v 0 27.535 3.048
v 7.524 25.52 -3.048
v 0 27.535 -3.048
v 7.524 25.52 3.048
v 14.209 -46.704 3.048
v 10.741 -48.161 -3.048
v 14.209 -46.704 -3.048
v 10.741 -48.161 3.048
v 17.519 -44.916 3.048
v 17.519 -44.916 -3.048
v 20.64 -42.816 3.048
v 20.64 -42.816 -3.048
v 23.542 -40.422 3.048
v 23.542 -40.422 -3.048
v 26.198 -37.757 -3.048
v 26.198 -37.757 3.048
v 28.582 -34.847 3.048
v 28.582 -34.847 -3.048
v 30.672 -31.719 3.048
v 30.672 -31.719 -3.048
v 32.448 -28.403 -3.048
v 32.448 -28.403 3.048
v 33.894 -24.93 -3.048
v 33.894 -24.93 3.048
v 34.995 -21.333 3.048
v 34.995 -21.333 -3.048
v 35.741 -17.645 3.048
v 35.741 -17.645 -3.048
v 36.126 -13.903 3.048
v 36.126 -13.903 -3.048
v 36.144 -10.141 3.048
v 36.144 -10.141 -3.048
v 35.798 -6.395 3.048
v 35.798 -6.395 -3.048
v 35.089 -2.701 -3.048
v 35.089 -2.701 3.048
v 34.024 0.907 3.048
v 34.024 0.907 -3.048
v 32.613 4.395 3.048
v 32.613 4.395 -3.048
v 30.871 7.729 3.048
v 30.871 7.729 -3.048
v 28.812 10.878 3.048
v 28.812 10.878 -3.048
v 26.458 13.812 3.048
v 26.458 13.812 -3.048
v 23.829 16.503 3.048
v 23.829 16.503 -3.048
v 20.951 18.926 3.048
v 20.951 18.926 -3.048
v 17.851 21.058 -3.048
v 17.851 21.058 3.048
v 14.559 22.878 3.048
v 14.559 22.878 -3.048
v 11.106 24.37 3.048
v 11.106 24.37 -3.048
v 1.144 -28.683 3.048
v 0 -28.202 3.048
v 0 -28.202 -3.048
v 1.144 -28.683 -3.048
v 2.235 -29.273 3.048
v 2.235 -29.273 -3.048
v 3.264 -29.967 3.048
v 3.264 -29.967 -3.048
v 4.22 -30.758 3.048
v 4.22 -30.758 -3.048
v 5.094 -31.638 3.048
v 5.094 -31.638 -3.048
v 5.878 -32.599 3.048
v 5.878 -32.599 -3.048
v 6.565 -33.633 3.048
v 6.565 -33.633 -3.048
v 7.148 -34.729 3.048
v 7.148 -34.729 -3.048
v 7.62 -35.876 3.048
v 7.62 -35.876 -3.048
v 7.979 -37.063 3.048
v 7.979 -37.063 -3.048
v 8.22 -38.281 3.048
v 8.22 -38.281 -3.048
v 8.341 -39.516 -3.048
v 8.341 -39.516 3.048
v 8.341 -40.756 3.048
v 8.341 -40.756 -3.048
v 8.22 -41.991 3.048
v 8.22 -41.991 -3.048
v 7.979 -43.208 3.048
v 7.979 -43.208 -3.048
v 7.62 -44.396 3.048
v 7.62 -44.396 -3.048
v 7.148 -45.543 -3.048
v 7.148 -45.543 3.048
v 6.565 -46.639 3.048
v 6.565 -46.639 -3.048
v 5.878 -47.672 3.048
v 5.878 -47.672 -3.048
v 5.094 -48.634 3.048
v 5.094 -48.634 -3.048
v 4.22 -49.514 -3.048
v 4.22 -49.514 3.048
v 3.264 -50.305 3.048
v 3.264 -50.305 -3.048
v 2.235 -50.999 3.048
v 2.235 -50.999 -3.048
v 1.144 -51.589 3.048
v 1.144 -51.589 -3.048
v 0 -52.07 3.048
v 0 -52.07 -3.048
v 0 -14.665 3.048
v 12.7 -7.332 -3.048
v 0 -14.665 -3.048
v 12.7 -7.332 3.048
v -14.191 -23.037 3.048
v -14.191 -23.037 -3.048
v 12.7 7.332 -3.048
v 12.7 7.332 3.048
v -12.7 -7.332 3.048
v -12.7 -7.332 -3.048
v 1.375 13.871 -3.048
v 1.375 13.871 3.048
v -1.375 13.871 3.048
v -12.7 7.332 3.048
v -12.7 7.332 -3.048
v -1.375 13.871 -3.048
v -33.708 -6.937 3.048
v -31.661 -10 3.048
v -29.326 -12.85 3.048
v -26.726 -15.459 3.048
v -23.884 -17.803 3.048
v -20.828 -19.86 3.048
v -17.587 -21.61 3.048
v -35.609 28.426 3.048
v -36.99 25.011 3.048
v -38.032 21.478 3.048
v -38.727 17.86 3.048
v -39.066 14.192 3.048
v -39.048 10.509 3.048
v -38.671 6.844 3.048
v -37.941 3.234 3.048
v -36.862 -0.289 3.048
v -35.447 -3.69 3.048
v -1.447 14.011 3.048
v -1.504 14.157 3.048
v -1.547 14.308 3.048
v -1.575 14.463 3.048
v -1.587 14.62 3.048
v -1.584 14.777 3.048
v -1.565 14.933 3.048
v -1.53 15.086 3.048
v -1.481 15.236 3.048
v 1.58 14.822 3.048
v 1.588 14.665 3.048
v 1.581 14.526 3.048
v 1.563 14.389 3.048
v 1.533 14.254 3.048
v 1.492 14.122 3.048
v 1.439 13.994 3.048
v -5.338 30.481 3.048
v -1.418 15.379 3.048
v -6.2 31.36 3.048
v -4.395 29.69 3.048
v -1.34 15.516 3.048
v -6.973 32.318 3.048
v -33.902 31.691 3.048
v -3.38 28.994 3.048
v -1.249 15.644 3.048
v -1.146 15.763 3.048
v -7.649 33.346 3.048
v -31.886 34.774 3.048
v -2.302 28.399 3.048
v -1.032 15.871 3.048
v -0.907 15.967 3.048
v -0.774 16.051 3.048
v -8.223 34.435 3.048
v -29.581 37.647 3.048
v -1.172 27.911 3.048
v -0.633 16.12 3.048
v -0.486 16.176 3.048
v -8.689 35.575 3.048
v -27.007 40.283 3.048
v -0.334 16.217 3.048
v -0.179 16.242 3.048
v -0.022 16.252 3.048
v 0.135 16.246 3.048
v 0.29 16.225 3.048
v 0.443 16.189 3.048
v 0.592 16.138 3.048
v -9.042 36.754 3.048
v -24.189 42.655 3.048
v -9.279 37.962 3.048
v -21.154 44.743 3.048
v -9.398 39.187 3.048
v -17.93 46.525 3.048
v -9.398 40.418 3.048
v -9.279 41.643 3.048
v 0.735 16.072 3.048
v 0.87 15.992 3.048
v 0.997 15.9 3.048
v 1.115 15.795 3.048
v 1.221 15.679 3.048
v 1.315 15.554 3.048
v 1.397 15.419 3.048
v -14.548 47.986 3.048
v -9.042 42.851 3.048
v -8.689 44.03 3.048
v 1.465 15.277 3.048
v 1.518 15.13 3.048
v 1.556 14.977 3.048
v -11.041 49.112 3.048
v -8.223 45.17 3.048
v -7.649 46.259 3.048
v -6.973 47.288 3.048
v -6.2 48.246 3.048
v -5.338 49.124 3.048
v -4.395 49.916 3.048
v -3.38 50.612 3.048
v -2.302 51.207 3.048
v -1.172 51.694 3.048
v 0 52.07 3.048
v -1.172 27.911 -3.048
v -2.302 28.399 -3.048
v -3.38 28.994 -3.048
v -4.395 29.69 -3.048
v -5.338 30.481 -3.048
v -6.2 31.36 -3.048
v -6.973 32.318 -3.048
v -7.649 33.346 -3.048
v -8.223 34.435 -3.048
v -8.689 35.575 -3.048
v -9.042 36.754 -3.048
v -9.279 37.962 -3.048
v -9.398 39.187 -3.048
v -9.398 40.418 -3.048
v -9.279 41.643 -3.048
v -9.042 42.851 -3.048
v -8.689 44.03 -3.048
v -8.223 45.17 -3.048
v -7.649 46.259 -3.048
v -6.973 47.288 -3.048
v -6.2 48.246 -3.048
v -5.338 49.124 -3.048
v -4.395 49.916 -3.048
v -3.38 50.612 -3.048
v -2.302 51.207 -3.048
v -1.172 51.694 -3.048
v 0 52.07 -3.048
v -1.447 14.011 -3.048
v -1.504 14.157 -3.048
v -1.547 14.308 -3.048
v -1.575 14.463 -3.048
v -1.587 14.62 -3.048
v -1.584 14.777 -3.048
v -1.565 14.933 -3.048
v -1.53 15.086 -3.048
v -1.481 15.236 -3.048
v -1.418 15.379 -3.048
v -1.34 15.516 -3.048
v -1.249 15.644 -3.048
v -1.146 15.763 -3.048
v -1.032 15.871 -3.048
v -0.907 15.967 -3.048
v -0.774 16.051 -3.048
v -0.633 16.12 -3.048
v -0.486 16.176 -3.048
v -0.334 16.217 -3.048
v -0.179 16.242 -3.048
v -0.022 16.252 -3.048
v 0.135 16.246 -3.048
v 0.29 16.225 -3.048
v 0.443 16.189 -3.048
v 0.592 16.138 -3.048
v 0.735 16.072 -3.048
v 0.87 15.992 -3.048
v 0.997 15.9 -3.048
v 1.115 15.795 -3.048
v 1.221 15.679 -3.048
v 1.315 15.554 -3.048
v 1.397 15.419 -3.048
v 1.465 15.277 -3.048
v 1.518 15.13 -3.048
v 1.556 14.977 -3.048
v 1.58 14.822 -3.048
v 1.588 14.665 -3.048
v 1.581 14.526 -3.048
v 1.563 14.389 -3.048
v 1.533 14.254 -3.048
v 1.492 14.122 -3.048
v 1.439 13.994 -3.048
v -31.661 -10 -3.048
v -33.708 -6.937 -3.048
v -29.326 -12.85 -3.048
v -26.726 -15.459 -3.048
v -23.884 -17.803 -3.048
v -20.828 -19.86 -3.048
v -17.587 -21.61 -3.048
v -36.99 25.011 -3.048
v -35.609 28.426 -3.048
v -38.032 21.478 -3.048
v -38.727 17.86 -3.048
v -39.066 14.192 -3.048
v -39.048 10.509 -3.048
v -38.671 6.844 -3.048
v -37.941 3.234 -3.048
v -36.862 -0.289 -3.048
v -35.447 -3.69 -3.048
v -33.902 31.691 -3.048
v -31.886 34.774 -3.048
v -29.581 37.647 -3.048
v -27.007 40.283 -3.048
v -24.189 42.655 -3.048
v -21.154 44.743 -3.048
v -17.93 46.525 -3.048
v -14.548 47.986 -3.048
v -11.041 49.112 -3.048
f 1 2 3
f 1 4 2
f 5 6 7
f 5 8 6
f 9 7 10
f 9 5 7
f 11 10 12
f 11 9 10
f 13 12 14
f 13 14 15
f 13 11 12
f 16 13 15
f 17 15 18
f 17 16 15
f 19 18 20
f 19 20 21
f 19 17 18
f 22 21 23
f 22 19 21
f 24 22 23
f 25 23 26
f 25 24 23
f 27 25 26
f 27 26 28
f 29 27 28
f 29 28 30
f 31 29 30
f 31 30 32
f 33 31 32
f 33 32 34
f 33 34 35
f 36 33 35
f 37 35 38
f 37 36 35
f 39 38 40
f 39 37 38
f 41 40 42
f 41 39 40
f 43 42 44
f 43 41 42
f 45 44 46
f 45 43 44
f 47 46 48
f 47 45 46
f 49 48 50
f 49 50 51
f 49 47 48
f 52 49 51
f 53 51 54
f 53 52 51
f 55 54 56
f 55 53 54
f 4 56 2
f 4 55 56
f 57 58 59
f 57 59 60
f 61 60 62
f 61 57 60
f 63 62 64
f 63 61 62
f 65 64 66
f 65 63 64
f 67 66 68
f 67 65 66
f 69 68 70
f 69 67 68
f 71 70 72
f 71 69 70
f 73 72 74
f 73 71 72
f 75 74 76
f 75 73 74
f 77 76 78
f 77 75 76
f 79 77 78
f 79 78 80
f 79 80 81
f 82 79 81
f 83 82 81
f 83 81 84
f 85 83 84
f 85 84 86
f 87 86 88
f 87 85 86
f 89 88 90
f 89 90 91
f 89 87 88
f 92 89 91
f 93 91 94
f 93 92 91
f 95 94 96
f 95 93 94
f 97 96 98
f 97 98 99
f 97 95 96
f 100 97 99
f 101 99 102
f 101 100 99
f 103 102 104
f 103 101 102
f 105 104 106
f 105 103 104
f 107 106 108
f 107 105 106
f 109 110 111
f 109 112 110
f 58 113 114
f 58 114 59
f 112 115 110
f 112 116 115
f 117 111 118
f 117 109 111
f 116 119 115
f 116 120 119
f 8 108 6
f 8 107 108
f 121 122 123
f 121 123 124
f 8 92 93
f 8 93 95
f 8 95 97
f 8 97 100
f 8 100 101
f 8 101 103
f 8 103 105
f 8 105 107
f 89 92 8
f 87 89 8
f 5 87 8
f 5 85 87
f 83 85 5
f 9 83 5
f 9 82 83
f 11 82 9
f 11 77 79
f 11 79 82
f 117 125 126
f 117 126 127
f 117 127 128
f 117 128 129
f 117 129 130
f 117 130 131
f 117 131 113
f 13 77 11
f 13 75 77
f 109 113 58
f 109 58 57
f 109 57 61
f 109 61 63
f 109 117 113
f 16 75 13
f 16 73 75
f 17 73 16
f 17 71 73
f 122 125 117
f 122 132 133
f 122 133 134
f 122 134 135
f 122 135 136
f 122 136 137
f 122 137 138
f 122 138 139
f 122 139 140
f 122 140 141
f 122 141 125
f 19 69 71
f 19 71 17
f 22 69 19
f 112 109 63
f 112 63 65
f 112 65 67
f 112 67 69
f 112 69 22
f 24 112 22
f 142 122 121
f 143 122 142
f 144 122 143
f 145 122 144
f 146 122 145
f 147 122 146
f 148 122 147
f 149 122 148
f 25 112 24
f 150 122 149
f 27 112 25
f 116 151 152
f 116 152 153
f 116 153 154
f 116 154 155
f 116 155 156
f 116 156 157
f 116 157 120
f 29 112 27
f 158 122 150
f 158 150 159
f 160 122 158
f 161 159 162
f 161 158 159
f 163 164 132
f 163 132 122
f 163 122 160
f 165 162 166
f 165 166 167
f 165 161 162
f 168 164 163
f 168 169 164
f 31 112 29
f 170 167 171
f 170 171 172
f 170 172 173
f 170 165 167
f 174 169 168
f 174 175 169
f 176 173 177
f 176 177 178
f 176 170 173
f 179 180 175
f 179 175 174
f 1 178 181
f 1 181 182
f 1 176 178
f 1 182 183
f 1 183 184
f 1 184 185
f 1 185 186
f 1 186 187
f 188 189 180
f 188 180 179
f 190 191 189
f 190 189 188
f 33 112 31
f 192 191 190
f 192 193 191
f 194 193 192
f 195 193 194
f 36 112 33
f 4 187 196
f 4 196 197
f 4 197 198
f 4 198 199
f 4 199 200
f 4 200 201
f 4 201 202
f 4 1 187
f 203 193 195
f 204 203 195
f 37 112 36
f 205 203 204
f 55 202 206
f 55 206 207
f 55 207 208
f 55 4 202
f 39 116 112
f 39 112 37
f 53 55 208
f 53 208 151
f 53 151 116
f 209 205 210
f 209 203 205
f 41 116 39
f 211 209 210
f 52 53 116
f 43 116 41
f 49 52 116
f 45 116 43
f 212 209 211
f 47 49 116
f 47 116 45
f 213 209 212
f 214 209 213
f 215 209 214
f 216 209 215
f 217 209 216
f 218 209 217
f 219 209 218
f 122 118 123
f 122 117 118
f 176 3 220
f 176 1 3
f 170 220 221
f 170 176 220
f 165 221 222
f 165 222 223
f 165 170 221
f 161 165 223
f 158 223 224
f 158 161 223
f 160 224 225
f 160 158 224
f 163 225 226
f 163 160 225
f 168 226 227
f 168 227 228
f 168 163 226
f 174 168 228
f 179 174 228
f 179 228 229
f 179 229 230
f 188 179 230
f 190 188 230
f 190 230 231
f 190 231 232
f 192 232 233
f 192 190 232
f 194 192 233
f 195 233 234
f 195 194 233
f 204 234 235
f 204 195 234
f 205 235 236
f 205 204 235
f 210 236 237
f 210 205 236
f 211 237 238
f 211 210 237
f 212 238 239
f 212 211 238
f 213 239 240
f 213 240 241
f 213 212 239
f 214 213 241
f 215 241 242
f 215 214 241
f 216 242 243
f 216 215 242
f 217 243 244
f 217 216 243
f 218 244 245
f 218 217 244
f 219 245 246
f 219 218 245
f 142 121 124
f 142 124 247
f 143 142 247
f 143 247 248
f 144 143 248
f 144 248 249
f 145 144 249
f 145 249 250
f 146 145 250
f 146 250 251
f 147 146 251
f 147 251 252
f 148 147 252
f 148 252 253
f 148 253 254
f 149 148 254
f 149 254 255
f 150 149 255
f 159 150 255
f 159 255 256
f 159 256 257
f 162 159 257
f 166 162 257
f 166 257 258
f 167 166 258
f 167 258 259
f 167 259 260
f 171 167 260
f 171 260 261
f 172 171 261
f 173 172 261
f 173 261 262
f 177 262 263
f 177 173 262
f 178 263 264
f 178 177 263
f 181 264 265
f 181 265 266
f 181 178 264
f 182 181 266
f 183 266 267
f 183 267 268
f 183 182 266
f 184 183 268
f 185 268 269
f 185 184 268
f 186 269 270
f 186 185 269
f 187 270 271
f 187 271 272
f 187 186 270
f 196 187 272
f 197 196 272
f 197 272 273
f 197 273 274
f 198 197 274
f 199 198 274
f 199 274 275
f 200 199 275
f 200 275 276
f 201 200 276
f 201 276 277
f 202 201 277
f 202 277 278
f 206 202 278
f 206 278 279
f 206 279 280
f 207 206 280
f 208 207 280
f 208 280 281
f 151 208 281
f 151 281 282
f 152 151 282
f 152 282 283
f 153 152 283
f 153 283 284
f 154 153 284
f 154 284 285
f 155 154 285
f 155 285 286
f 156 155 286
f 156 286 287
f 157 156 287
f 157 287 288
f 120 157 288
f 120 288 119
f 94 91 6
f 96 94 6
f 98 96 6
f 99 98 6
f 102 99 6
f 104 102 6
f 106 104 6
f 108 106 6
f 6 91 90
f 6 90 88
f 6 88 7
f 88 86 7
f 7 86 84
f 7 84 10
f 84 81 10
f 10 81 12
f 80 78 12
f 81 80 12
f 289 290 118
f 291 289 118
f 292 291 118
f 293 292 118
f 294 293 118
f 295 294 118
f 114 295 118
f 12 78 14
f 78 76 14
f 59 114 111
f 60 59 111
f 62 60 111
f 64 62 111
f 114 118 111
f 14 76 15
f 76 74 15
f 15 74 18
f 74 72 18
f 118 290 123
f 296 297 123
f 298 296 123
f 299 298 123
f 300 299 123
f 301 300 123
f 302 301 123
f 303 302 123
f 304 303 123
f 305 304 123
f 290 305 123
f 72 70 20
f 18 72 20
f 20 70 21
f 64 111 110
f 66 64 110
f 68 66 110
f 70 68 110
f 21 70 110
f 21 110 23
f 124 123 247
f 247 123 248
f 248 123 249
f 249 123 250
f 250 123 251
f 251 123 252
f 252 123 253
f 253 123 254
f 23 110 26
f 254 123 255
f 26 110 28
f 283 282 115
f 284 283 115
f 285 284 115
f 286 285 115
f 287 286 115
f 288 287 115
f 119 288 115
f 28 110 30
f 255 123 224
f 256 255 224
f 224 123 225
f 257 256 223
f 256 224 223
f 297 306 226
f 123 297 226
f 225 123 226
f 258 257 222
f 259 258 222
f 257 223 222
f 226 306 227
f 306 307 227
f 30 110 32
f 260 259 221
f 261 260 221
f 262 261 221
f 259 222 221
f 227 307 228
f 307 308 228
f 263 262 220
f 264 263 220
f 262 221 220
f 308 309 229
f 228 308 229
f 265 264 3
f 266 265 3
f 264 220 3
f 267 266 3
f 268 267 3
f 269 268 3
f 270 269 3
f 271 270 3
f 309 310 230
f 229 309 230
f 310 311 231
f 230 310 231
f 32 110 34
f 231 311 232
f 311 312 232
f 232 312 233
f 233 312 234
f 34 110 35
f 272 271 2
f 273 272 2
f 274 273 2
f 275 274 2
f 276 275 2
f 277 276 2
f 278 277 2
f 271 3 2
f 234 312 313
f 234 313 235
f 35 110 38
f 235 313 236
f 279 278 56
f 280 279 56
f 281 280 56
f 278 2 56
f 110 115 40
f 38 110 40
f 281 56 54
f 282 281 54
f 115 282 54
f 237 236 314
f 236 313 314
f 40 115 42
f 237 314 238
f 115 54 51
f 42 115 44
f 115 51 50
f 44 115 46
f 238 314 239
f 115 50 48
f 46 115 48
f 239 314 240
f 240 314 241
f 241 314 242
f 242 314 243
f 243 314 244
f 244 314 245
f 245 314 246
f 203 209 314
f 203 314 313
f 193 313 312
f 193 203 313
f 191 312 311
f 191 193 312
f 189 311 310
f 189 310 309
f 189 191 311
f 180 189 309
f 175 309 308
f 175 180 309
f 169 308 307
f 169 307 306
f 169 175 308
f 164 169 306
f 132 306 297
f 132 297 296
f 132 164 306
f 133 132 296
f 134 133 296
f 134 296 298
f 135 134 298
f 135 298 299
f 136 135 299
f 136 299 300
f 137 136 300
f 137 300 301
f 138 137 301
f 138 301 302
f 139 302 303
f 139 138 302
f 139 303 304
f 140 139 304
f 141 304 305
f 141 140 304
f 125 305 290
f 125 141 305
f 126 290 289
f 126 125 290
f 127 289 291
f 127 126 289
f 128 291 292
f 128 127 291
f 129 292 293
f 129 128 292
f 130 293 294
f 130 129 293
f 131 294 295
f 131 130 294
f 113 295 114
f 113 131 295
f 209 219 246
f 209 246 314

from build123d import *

# Parameters (mm, degrees)
BOSS_EXTRUDE1_DEPTH = 3.048


with BuildPart() as part:
    # Sketch1 → Boss-Extrude1 (new body, symmetric)
    with BuildSketch(Plane.XY):
        with BuildLine():
            ThreePointArc((0, 27.535484012), (-9.412998127, 39.802742006), (0, 52.07))
            Line((0, 52.07), (-11.040532194, 49.111698314))
            ThreePointArc((-11.040532194, 49.111698314), (-39.066320922, 14.192289272), (-14.190605813, -23.03684931))
            Line((-14.190605813, -23.03684931), (0, -28.201807432))
            ThreePointArc((0, -28.201807432), (8.35634418, -40.135903716), (0, -52.07))
            Line((0, -52.07), (10.740686656, -48.160709762))
            ThreePointArc((10.740686656, -48.160709762), (36.144496882, -10.141220984), (7.52373904, 25.519504212))
            Line((7.52373904, 25.519504212), (0, 27.535484012))
        make_face()
        with BuildLine():
            Line((-12.7, 7.332348419), (-1.374815329, 13.870946837))
            ThreePointArc((-1.374815329, 13.870946837), (-0.410875234, 16.198104087), (1.5875, 14.664696837))
            ThreePointArc((1.5875, 14.664696837), (1.533407249, 14.253821603), (1.374815329, 13.870946837))
            Line((1.374815329, 13.870946837), (12.7, 7.332348419))
            Line((12.7, 7.332348419), (12.7, -7.332348419))
            Line((12.7, -7.332348419), (0, -14.664696837))
            Line((0, -14.664696837), (-12.7, -7.332348419))
            Line((-12.7, -7.332348419), (-12.7, 7.332348419))
        make_face(mode=Mode.SUBTRACT)
    extrude(amount=BOSS_EXTRUDE1_DEPTH, both=True)


solid = part.part
